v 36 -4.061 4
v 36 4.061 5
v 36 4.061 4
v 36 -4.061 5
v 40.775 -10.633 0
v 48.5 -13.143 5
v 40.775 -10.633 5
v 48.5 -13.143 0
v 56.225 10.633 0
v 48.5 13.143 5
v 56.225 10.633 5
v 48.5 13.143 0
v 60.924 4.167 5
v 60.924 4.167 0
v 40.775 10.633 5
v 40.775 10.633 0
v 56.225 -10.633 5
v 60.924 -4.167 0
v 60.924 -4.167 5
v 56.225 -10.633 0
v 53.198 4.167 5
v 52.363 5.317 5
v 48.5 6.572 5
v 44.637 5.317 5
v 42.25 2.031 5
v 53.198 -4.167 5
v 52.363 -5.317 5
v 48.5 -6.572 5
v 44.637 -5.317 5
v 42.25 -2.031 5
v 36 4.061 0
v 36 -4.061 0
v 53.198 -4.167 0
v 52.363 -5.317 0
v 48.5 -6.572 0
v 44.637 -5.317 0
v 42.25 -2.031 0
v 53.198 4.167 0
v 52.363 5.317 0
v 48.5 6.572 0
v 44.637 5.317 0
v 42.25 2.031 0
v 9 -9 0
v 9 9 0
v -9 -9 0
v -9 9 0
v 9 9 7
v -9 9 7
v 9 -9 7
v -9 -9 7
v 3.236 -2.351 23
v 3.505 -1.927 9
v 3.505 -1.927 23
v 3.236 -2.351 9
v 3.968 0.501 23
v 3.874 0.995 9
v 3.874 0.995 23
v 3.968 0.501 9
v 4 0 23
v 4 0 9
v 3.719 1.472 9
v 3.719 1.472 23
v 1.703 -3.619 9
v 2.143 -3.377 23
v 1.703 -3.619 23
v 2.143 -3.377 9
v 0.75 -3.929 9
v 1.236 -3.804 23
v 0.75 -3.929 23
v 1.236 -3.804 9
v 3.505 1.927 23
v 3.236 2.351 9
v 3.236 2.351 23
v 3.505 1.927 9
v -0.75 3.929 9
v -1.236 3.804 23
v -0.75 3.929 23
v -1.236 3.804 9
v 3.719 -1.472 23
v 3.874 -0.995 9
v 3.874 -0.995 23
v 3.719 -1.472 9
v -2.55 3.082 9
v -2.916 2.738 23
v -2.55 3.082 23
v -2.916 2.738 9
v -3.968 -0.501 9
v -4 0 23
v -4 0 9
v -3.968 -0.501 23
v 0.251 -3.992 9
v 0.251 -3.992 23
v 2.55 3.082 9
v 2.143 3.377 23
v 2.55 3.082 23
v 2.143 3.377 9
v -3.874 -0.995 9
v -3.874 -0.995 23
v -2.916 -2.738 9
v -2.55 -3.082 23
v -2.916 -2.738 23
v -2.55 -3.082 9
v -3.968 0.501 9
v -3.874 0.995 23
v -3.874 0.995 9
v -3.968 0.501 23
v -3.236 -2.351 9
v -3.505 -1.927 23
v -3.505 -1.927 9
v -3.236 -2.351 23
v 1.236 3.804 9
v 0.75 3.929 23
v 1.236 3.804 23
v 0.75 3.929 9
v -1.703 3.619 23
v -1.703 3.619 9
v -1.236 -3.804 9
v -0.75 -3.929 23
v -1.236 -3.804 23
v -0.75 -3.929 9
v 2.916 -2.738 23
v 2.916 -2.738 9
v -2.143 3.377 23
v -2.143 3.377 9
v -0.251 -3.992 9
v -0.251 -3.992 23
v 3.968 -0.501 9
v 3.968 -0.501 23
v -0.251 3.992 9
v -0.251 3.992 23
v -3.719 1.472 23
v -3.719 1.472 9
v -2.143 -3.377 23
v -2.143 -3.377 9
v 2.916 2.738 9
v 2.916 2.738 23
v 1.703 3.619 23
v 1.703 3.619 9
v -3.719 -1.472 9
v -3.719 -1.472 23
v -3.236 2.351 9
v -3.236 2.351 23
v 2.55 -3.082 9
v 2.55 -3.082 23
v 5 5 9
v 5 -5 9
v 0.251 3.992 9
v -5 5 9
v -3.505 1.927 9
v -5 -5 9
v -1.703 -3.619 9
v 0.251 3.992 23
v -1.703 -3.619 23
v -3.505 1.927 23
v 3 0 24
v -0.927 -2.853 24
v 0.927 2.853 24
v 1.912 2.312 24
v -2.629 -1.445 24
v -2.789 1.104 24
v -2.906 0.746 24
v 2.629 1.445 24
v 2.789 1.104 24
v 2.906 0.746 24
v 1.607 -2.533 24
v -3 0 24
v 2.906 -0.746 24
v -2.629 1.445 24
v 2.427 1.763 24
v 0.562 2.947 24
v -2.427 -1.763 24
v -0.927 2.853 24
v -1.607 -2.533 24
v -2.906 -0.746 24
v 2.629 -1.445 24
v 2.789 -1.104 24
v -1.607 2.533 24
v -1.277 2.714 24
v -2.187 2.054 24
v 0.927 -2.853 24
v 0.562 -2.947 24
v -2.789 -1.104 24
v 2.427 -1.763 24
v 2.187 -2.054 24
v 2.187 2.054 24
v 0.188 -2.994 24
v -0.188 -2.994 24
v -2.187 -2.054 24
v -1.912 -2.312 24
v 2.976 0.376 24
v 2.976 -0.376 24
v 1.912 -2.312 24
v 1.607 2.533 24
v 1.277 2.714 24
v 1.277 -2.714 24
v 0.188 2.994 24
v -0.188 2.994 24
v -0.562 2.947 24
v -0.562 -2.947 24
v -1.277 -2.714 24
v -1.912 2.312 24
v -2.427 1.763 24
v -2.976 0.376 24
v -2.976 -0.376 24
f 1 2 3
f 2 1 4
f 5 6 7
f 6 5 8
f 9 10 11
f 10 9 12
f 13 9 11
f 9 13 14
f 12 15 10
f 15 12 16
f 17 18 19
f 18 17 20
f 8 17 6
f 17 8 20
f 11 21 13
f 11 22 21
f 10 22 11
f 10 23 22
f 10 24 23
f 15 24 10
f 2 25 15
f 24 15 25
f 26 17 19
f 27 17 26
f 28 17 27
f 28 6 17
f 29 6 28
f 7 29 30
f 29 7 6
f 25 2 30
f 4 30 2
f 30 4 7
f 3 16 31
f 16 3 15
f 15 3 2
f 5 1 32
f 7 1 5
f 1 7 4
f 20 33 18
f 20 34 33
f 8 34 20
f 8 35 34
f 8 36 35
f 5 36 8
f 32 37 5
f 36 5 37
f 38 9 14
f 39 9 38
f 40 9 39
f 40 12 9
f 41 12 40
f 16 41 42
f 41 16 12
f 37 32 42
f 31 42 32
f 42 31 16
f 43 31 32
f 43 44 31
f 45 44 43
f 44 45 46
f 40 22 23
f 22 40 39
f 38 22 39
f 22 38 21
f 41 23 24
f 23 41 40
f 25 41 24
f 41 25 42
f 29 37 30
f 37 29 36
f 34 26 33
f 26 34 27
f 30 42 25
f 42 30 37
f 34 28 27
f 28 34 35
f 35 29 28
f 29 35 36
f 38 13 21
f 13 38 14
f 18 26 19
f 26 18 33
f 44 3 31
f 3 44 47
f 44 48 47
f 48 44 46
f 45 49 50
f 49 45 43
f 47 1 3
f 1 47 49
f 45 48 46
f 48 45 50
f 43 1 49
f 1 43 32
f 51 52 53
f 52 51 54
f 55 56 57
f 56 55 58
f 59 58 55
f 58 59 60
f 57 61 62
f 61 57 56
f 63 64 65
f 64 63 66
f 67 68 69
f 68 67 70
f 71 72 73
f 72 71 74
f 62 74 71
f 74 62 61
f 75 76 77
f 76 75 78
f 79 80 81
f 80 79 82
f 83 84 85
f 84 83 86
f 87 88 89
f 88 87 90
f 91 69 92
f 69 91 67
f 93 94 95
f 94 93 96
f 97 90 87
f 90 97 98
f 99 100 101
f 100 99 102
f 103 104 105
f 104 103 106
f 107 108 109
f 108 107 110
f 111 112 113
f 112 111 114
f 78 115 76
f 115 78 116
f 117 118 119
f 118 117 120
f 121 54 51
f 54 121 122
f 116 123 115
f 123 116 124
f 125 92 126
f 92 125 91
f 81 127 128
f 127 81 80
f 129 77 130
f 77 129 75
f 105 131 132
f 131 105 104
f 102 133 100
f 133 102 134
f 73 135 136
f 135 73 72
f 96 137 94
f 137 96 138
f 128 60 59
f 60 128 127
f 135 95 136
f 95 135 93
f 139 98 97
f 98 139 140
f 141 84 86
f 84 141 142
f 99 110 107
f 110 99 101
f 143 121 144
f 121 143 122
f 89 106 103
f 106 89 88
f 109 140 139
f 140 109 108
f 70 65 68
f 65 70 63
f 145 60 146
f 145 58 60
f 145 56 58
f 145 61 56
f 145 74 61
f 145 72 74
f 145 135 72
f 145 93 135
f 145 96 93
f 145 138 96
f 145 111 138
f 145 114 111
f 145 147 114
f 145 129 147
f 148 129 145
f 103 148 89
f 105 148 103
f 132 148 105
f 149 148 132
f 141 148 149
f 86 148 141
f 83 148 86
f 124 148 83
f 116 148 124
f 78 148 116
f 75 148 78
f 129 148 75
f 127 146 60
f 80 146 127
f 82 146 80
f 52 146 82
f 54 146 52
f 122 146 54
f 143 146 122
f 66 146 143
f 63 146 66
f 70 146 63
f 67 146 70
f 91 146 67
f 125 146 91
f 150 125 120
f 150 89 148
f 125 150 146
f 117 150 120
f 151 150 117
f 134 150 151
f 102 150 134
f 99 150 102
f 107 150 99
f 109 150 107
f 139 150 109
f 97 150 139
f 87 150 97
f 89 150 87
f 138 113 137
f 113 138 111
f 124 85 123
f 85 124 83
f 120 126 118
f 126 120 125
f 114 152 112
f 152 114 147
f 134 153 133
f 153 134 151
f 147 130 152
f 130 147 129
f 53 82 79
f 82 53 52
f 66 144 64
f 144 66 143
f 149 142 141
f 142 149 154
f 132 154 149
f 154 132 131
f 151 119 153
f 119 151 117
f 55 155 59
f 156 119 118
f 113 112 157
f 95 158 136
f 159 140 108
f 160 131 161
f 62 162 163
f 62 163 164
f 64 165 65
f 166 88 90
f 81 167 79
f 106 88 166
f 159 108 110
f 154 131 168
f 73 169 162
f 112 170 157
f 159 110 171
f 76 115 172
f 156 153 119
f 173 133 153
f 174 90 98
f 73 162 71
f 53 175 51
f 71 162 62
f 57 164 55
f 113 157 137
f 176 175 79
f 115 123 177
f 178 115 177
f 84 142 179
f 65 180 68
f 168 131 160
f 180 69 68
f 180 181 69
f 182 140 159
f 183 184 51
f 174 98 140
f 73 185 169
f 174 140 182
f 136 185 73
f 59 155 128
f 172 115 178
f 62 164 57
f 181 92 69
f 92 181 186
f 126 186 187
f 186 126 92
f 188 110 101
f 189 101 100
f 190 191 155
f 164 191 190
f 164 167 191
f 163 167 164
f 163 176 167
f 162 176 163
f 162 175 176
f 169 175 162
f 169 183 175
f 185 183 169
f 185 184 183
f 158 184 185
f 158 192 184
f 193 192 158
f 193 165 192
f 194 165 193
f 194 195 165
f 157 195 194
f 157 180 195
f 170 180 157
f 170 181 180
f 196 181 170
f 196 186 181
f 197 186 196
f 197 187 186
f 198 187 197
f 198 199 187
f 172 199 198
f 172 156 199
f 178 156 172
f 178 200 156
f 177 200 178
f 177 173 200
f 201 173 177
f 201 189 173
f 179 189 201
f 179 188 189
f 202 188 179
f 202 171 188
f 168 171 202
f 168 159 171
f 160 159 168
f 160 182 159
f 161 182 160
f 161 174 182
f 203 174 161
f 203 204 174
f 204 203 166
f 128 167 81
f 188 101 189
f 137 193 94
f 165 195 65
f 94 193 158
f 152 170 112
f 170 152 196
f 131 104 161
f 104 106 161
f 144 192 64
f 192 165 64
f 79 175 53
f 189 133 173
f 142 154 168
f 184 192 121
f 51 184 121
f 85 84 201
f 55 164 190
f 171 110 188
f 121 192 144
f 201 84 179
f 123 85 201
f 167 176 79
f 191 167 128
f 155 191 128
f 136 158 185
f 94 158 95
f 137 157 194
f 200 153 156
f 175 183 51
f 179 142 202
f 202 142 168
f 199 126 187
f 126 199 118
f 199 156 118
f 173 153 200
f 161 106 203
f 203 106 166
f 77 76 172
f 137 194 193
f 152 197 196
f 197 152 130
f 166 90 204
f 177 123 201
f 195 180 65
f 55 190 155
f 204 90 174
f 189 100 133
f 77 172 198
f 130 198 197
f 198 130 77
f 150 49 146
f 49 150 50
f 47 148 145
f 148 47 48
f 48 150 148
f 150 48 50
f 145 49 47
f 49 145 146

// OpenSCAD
///////////////////////////////////////////////////////////////////////////////////////////////
// arm customizer[OBLOBOTS] 
//////////////////////////////////////////////////////////////////////////////////////////////////
// (c) Jorge Medal (@oblomobka) - Sara Alvarellos (@trecedejunio) 2014-05 
//////////////////////////////////////////////////////////////////////////////////////////////////
// GPL license
//////////////////////////////////////////////////////////////////////////////////////////////////

/* [Parámetros del brazo] */

// Como quieres que esté construido el brazo del oblobot
TIPO_BRAZO="Rectas";		//[Rectas,Curvas]

Longitud_Brazo=70;		//[45:100]

Hombro=18;				//[18:Pequeño,22:Mediano,28:Grande]

Mano=25;					//[18:Pequeña,25:Mediana,32:Grande]

Tipo_Mano=4;				//[1,2,3,4]

/* [Parámetros de la unión] */

TIPO_UNION="Macho";		//[Hembra,Macho]

Diametro=8;				//[3:15]
Altura=15;				//[5:20]

/* [Hidden] */

Altura_brazo=7;
Altura_brazo_b=2;


if(TIPO_BRAZO=="Rectas"){
	if(TIPO_UNION=="Hembra"){
		arm_union_quadrangle(arm=[Hombro,Altura_brazo,Altura_brazo_b,Longitud_Brazo],hand=[Mano,Altura_brazo-2,2+Tipo_Mano*2],pin=[Diametro,20]);
		}
	else{
		union(){
			arm_quadrangle(arm=[Hombro,Altura_brazo,Longitud_Brazo],hand=[Mano,Altura_brazo-2,2+Tipo_Mano*2]);
			translate([0,0,Altura_brazo])
				pin_simple(pin=[Diametro,Altura],base=[Hombro,Diametro+2,Altura_brazo_b,4]);
			}
		}
	}

else{
	if(TIPO_UNION=="Hembra"){
		arm_union_cylindrical(arm=[Hombro,Altura_brazo,Altura_brazo_b,Longitud_Brazo],hand=[Mano,Altura_brazo-2,1+60*(Tipo_Mano-1)],pin=[Diametro,20]);
		}
	else{
		union(){
			arm_cylindrical(arm=[Hombro,Altura_brazo,Longitud_Brazo],hand=[Mano,Altura_brazo-2,1+60*(Tipo_Mano-1)]);
			translate([0,0,Altura_brazo])
				pin_simple(pin=[Diametro,Altura],base=[Hombro,Diametro+2,Altura_brazo_b,50]);
			}
		}
	}

	


// Limites


// ARMS | HANDS

	d_pin_minmax=[10,30];			//	d_pin=lim(d_pin_minmax[0],pin[0],d_pin_minmax[1]);			
	h_pin_minmax=[0,10];			//	h_pin=lim(h_pin_minmax[0],pin[1],h_pin_minmax[1]);

	// C
	d_arm_minmax=[10,40];			// 	d_arm=lim(d_arm_minmax[0],arm[0],d_arm_minmax[1]);
								//	d_arm=lim(d_pin+1,arm[0],d_arm_minmax[1]);	
	h_arm_minmax=[5,25];			// 	h_arm=lim(h_arm_minmax[0],arm[1],h_arm_minmax[1]);
	armpit_minmax=[0.3,60];		//	armpit=lim(armpit_minmax[0],arm[2],armpit_minmax[1]);
	l_arm_minmax=[20,120];		// 	l_arm=lim(d_arm+d_hand,arm[2],l_arm_minmax[1]);	

	d_hand_minmax=[10,60];		//	d_hand=lim(d_hand_minmax[0],hand[0],d_hand_minmax[1]);
	h_hand_minmax=[3,25];			//	h_hand=lim(h_hand_minmax[0],hand[1],h_arm-0.5);
	angle_hand_minmax=[0,180];	//	angle_hand=lim(angle_hand_minmax[0],hand[2]/2,angle_hand_minmax[1]);

	// Q
	x_arm_minmax=[5,25];			// 	x_arm=lim(x_arm_minmax[0],arm[1],x_arm_minmax[1]);
	y_arm_minmax=[10,40];			// 	y_arm=lim(y_arm_minmax[0],arm[0],y_arm_minmax[1]);
	z_arm_minmax=[20,120];		//	z_arm=lim(y_arm+5+d_hand,arm[2],z_arm_minmax[1]);

	n_hand_minmax=[4,12];			// 	n_hand=lim(n_hand_minmax[0],2*floor(hand[2]/2),n_hand_minmax[1]);
								//	h_hand=lim(h_hand_minmax[0],hand[1],x_arm-0.5);

// limita los posibles valores de x, que siempre estarán comprendidos entre un minimo(a) y un maximo(z)
function lim(a,x,z)=max(a,min(x,z));

//////////////////////////////////////////////////////////////////
///////////// MODULO arm_union_cylindrical()  ////////////////////

module arm_union_cylindrical (	arm=[18,10,1,65],					// [d,h,armpit,l]
								hand=[22,8,120],					// [d,h,ang]
								pin=[6,20],						//  
								play=0,
								resolution=50
								){

d_pin=lim(d_pin_minmax[0],pin[0],d_pin_minmax[1]);			// diámetro del pin
h_pin=lim(h_pin_minmax[0],pin[1],h_pin_minmax[1]);			// longitud del pin

d_arm=lim(d_pin+1,arm[0],d_arm_minmax[1]);					// medida del brazo: fondo	
h_arm=lim(h_arm_minmax[0],arm[1],h_arm_minmax[1]);			// medida del brazo: ancho
armpit=lim(armpit_minmax[0],arm[2],armpit_minmax[1]);		// medida de la axila

d_hand=lim(d_hand_minmax[0],hand[0],d_hand_minmax[1]);

l_arm=lim(d_arm+d_hand,arm[3],l_arm_minmax[1]);				// medida del brazo: longitud

difference(){
	union(){
		arm_cylindrical(arm=[d_arm,h_arm,l_arm],hand=hand);
		translate([0,0,h_arm])cylinder(r1=d_arm/2,r2=(d_pin+4)/2,h=armpit);
		}
	// Huecos hexagonales para introducir una espiga
	gap(gap=pin,deep=pin[1],play=play);
	translate([0,0,h_arm+armpit])rotate([180,0,0])
		gap(gap=pin,deep=pin[1],play=play);
	}
}

// -------------- Fin del módulo arm_union_cylindrical () -----------------
// ------------------------------------------------------------------------


//////////////////////////////////////////////////////////////////
///////////// MODULO arm_union_quadrangle()  ////////////////////

module arm_union_quadrangle (	arm=[18,10,2,65],			// [grosor(x),fondo(y),armpit,longitud(z)] Medidas de los Brazo
							hand=[22,8,8],			// [d,h,n lados]
							pin=[6,20],				
							play=0,
							resolution=50
							){

// valores con límites: acotados entre un máximo y un mínimo (los valores límite están en <limits_oblobots.scad>)
d_pin=lim(d_pin_minmax[0],pin[0],d_pin_minmax[1]);		// diámetro del pin
h_pin=lim(h_pin_minmax[0],pin[1],h_pin_minmax[1]);		// longitud del pin

x_arm=lim(x_arm_minmax[0],arm[1],x_arm_minmax[1]);				// medida del brazo: grosor
y_arm=lim(d_pin+1,arm[0],y_arm_minmax[1]);						// medida del brazo: fondo
armpit=lim(armpit_minmax[0],arm[2],armpit_minmax[1]);	// medida de la axila

d_hand=lim(d_hand_minmax[0],hand[0],d_hand_minmax[1]);
h_hand=lim(h_hand_minmax[0],hand[1],x_arm-0.5);
n_hand=lim(n_hand_minmax[0],2*floor(hand[2]/2),n_hand_minmax[1]);	// [4,6,8,10,12] nº de lados del polígono de la mano

z_arm=lim(y_arm+5+d_hand,arm[3],z_arm_minmax[1]);	// medida del brazo: longitud

// Volumen
difference(){
	union(){
		arm_quadrangle(arm=[y_arm,x_arm,z_arm],hand=hand);
		translate([0,0,x_arm])
			pyramid_circumscribed (d1=y_arm,d2=d_pin+3,h=armpit,n=4);
		}
	// Huecos hexagonales para introducir una espiga
	gap(gap=pin,deep=pin[1],play=play);
	translate([0,0,x_arm+armpit])rotate([180,0,0])
		gap(gap=pin,deep=pin[1],play=play);
	}
}


// -------------- Fin del módulo arm_union_quadrangle () -----------------
// ------------------------------------------------------------------------

//////////////////////////////////////////////////////////////////
///////////// MODULO arm_cylindrical()  //////////////////////////

module arm_cylindrical (	arm=[18,6,45],		// [d,h,l]
						hand=[27,4,120]		// [d,h,ang]
						){

// valores con límites: acotados entre un máximo y un mínimo (los valores límite están en <limits_oblobots.scad>)
d_arm=lim(d_arm_minmax[0],arm[0],d_arm_minmax[1]);			// medida del brazo: fondo
h_arm=lim(h_arm_minmax[0],arm[1],h_arm_minmax[1]);			// medida del brazo: ancho

d_hand=lim(d_hand_minmax[0],hand[0],d_hand_minmax[1]);
h_hand=lim(h_hand_minmax[0],hand[1],h_arm-0.5);
angle_hand=lim(angle_hand_minmax[0],hand[2]/2,angle_hand_minmax[1]);			//max(0,min(180,hand[2]/2));

l_arm=lim(d_arm+d_hand,arm[2],l_arm_minmax[1]);			// medida del brazo: longitud

// variables condicionadas a los valores de entrada
d_i_hand=d_hand/2;
d2_arm=d_arm-h_arm;
wrist=d_hand/3;
h_i_arm=h_arm/2;
l_i_arm=l_arm-d_arm/2-d_hand/2;

$fn=50;

// Volumen 
union(){
	difference(){
		union(){
			// brazo
			hull(){
				translate([0,0,h_arm-h_i_arm])
					cylinder(r=d_arm/2,h=h_i_arm);
				translate([0,0,0])
					cylinder(r=d2_arm/2,h=h_arm-h_i_arm);
				translate([l_i_arm-d_hand/2+wrist/2,0,0])
					cylinder(r=wrist/2,h=h_hand-1.5);
				}
			// mano
			translate([l_i_arm,0,0])
				cylinder(r1=d_hand/2,r2=(d_hand/2)*1,h=h_hand);
			}
			// hueco de la mano
			translate([l_i_arm,0,0])
				cylinder(r=d_i_hand/2,h=h_arm*2+2,center=true);
			// Garra
			for(i=[0,1]){
				mirror([0,i,0])		
					difference(){
						translate([l_i_arm,-0.01,-2])
							cube([d_hand,d_hand,2*h_arm-2]);
						translate([l_i_arm,0,-2])
							rotate([0,0,angle_hand])
								cube([d_hand,d_hand,2*h_arm-2]);
						}
				}
		}

	if(hand[2]>=180){
		for(i=[0,1]){
			mirror([0,i,0])
				translate([l_i_arm+d_hand/4,3*(d_hand-d_i_hand)/4,h_hand/2])
					cube([d_hand/2,(d_hand-d_i_hand)/2,h_hand],center=true);
			}
		}
	}
}

// -------------- Fin del módulo arm_cylindrical () -----------------------
// ------------------------------------------------------------------------


////////////////////////////////////////////////////////////////////////
/////////////////// MODULO arm_quadrangle()  ///////////////////////////

module arm_quadrangle (	arm=[10,15,70],		// [ grosor(x), fondo(y), longitud(z) ] Medidas de los Brazo
						hand=[20,5,8]
						){

x_arm=lim(x_arm_minmax[0],arm[1],x_arm_minmax[1]);					// medida del brazo: grosor
y_arm=lim(y_arm_minmax[0],arm[0],y_arm_minmax[1]);					// medida del brazo: fondo

d_hand=lim(d_hand_minmax[0],hand[0],d_hand_minmax[1]);
h_hand=lim(h_hand_minmax[0],hand[1],x_arm-0.5);
n_hand=lim(n_hand_minmax[0],2*floor(hand[2]/2),n_hand_minmax[1]);	// [4,6,8,10,12] nº de lados del polígono de la mano

z_arm=lim(y_arm+5+d_hand,arm[2],z_arm_minmax[1]);					// medida del brazo: longitud



//side=2*tan(180/tn)*td/2;		// medida del lado

wrist=2*(d_hand/2)*tan(180/max(6,n_hand));
h_wrist=h_hand-1;
z_i_arm=z_arm-(y_arm/2)-d_hand-(wrist/2);

translate([0,0,x_arm])
mirror([0,0,1])
union(){
	difference(){
		hull(){
			translate([0,0,x_arm/2])
				cube([y_arm,y_arm,x_arm],center=true);
			translate([z_i_arm,0,x_arm-h_wrist/2])
				cube([wrist,wrist,h_wrist],center=true);
			}
		// rebaje del hombro / forma poligonal
		//translate([0,0,x_arm/2+2])
			//prism_circumscribed (n=n_hand,d=2*y_arm/4,h=x_arm/2);
		}
	// Mano
	difference(){
		translate([z_i_arm+wrist/2+d_hand/2,0,x_arm-h_hand])
			prism_circumscribed (n=n_hand,d=d_hand,h=h_hand);
		translate([z_i_arm+wrist/2+d_hand/2,0,0])
			prism_circumscribed (n=n_hand,d=d_hand/2,h=x_arm*2);
		translate([z_i_arm+wrist/2+3*d_hand/4,0,x_arm])
			cube([d_hand/2+1,d_hand/3,2*x_arm],center=true);
		}
	}
}

// -------------- Fin del módulo arm_quadrangle() -------------------------------
// ------------------------------------------------------------------------------

module prism_circumscribed (	n=4,			// nº lados de la base del prisma
							d=20,		// diámetro del círculo donde se circunscribe el prisma
							h=10			// altura del prisma
							){
if(n%2==0){
	rotate([0,0,180/n])
		cylinder (r=d/2/cos(180/n), h=h, $fn=n);
	}
	else{
		rotate([0,0,90/n])
			cylinder (r=d/2/cos(180/n), h=h, $fn=n);
		}
}

module pyramid_circumscribed (	n=4,			// nº lados de la base de la pirámide	
								d1=20,		// diámetro del círculo-base donde se circunscribe la pirámide
								d2=0,		// diámetro del círculo-punta donde se circunscribe la pirámide
								h=10			// altura de la pirámide
								){
if(n%2==0){
	rotate([0,0,180/n])
		cylinder (r1=d1/2/cos(180/n), r2=d2/2/cos(180/n), h=h, $fn=n);
	}
	else{
		rotate([0,0,90/n])
			cylinder (r1=d1/2/cos(180/n), r2=d2/2/cos(180/n), h=h, $fn=n);
		}
}

module gap (gap=[6,20], deep=15, play=0){								
$fn=6;

h=gap[1];
d=gap[0]+0.25+play;

translate([0,0,-0.1])
	union(){
		pyramid_circumscribed (d1=d+2,d2=d,h=1,n=6);
		translate([0,0,0.9])
			prism_circumscribed (d=d,h=deep+0.1,n=6);
		}	
}

module pin_simple(	pin=[12,20],		// [d,h]	medidas generales del pin
					base=[0,0,0,0],			// [d1,d2,h,n] medidas y forma de la base. Opcional
					){
					
$fn=50;


dp=lim(4,pin[0],20);								// diámetro del pin
hp=lim(5,pin[1],30);								// longitud del pin
db1=lim(dp,base[0],100);							// diámetro de la base1
db2=lim(dp,base[1],db1);							// diámetro de la base2 si es =db1 es un prisma rectangular
hb=base[2];										// longitud de la base
nb=lim(4,base[3],50);								// lim:(4<-->50) nº de lados del prisma base	

hp1=1;											// rebaje de la punta
hp2=hp-hp1;

translate([0,0,hb])
	union(){
		cylinder(r=dp/2, h=hp2);
		translate([0,0,hp2])
			cylinder (r1=dp/2,r2=(dp-2)/2,h=hp1);
		if(hb==0){
				translate([0,0,-hb])
					pyramid_circumscribed(d1=db1,d2=db2,h=hb,n=0);
				}
			else{
				translate([0,0,-hb])
					pyramid_circumscribed(d1=db1,d2=db2,h=hb,n=nb);
				}
		}
}
